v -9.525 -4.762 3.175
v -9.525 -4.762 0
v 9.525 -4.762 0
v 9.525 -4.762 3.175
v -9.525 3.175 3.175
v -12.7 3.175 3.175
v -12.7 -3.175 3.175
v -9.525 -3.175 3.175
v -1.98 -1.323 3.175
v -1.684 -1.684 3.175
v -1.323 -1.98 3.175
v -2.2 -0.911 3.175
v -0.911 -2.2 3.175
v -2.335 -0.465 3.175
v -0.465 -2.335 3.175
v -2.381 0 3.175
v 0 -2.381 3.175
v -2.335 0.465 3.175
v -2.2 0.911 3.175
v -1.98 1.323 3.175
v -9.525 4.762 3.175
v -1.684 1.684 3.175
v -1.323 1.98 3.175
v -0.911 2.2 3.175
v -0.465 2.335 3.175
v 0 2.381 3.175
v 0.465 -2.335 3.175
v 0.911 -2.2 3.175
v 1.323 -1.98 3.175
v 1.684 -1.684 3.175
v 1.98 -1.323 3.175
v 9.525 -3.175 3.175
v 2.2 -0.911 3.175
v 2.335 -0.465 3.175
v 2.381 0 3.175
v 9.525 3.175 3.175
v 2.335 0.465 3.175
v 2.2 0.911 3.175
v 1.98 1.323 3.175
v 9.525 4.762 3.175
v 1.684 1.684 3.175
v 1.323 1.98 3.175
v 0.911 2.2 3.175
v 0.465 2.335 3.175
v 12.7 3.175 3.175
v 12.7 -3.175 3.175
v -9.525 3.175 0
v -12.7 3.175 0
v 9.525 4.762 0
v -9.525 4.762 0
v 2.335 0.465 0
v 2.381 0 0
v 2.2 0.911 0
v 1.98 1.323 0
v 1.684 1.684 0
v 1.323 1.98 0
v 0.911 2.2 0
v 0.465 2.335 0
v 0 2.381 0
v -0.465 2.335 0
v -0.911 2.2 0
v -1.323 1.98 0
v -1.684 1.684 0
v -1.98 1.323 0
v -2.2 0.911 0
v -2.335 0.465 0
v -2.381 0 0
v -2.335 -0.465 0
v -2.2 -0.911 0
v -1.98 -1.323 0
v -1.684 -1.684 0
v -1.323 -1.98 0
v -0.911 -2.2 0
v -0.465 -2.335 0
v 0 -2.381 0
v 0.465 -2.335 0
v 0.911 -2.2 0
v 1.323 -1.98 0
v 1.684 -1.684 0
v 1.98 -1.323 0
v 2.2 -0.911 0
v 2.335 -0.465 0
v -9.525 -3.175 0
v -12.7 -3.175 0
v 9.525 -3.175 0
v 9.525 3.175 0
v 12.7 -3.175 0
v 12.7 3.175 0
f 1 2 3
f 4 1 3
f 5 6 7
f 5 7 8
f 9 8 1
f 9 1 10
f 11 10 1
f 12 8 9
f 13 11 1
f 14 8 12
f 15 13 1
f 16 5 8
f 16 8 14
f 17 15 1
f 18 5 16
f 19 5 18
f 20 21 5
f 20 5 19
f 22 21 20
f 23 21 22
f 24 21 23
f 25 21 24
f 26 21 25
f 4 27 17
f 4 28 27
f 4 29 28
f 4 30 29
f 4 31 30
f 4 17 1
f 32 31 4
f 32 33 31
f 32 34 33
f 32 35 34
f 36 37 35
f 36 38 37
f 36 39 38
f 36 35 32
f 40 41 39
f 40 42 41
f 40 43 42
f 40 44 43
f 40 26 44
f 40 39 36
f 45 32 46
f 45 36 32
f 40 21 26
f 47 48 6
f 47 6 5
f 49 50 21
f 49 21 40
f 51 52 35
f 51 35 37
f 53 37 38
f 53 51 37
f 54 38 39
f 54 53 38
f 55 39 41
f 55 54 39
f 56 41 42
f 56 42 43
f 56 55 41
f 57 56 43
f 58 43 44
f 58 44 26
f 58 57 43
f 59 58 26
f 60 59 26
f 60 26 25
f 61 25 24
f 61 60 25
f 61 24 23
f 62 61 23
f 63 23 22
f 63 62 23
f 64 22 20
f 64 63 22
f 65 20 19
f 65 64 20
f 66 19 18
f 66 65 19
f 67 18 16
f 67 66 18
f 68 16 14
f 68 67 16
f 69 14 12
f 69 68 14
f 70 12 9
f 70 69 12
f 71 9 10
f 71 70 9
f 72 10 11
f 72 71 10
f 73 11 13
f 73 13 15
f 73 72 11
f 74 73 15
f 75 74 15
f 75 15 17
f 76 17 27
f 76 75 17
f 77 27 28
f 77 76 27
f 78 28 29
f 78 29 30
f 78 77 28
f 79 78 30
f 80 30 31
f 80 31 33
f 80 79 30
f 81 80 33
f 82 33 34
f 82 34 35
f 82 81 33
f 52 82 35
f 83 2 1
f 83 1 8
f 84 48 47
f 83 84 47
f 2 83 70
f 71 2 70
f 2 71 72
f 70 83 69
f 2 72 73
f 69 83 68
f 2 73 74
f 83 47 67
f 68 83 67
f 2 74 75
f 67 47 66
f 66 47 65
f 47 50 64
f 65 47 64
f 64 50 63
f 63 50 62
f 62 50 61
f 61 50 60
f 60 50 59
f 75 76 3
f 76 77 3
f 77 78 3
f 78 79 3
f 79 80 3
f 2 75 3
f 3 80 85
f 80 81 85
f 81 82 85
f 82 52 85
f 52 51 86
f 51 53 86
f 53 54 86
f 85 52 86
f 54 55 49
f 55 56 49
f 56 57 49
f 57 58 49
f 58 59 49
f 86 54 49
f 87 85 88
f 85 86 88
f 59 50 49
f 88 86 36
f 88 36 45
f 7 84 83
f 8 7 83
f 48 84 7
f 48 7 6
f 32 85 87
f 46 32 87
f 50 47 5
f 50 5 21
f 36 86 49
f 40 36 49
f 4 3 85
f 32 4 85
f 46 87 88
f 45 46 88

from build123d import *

# Parameters (mm, degrees)
SKETCH1_W           = 3.175
SKETCH1_H           = 6.35
SKETCH1_W_2         = 19.05
SKETCH1_H_2         = 9.525
SKETCH1_R           = 2.38125
BOSS_EXTRUDE1_DEPTH = 3.175


with BuildPart() as part:
    # Sketch1 → Boss-Extrude1 (new body)
    # profile 1 of 3: a face of its own
    with BuildSketch(Plane.XY):
        with Locations((-11.1125, 0)):
            Rectangle(SKETCH1_W, SKETCH1_H)
    # profile 2 of 3: a face of its own
    with BuildSketch(Plane.XY):
        Rectangle(SKETCH1_W_2, SKETCH1_H_2)
        Circle(SKETCH1_R, mode=Mode.SUBTRACT)
    # profile 3 of 3: a face of its own
    with BuildSketch(Plane.XY):
        with Locations((11.1125, 0)):
            Rectangle(SKETCH1_W, SKETCH1_H)
    extrude(amount=BOSS_EXTRUDE1_DEPTH)


solid = part.part
